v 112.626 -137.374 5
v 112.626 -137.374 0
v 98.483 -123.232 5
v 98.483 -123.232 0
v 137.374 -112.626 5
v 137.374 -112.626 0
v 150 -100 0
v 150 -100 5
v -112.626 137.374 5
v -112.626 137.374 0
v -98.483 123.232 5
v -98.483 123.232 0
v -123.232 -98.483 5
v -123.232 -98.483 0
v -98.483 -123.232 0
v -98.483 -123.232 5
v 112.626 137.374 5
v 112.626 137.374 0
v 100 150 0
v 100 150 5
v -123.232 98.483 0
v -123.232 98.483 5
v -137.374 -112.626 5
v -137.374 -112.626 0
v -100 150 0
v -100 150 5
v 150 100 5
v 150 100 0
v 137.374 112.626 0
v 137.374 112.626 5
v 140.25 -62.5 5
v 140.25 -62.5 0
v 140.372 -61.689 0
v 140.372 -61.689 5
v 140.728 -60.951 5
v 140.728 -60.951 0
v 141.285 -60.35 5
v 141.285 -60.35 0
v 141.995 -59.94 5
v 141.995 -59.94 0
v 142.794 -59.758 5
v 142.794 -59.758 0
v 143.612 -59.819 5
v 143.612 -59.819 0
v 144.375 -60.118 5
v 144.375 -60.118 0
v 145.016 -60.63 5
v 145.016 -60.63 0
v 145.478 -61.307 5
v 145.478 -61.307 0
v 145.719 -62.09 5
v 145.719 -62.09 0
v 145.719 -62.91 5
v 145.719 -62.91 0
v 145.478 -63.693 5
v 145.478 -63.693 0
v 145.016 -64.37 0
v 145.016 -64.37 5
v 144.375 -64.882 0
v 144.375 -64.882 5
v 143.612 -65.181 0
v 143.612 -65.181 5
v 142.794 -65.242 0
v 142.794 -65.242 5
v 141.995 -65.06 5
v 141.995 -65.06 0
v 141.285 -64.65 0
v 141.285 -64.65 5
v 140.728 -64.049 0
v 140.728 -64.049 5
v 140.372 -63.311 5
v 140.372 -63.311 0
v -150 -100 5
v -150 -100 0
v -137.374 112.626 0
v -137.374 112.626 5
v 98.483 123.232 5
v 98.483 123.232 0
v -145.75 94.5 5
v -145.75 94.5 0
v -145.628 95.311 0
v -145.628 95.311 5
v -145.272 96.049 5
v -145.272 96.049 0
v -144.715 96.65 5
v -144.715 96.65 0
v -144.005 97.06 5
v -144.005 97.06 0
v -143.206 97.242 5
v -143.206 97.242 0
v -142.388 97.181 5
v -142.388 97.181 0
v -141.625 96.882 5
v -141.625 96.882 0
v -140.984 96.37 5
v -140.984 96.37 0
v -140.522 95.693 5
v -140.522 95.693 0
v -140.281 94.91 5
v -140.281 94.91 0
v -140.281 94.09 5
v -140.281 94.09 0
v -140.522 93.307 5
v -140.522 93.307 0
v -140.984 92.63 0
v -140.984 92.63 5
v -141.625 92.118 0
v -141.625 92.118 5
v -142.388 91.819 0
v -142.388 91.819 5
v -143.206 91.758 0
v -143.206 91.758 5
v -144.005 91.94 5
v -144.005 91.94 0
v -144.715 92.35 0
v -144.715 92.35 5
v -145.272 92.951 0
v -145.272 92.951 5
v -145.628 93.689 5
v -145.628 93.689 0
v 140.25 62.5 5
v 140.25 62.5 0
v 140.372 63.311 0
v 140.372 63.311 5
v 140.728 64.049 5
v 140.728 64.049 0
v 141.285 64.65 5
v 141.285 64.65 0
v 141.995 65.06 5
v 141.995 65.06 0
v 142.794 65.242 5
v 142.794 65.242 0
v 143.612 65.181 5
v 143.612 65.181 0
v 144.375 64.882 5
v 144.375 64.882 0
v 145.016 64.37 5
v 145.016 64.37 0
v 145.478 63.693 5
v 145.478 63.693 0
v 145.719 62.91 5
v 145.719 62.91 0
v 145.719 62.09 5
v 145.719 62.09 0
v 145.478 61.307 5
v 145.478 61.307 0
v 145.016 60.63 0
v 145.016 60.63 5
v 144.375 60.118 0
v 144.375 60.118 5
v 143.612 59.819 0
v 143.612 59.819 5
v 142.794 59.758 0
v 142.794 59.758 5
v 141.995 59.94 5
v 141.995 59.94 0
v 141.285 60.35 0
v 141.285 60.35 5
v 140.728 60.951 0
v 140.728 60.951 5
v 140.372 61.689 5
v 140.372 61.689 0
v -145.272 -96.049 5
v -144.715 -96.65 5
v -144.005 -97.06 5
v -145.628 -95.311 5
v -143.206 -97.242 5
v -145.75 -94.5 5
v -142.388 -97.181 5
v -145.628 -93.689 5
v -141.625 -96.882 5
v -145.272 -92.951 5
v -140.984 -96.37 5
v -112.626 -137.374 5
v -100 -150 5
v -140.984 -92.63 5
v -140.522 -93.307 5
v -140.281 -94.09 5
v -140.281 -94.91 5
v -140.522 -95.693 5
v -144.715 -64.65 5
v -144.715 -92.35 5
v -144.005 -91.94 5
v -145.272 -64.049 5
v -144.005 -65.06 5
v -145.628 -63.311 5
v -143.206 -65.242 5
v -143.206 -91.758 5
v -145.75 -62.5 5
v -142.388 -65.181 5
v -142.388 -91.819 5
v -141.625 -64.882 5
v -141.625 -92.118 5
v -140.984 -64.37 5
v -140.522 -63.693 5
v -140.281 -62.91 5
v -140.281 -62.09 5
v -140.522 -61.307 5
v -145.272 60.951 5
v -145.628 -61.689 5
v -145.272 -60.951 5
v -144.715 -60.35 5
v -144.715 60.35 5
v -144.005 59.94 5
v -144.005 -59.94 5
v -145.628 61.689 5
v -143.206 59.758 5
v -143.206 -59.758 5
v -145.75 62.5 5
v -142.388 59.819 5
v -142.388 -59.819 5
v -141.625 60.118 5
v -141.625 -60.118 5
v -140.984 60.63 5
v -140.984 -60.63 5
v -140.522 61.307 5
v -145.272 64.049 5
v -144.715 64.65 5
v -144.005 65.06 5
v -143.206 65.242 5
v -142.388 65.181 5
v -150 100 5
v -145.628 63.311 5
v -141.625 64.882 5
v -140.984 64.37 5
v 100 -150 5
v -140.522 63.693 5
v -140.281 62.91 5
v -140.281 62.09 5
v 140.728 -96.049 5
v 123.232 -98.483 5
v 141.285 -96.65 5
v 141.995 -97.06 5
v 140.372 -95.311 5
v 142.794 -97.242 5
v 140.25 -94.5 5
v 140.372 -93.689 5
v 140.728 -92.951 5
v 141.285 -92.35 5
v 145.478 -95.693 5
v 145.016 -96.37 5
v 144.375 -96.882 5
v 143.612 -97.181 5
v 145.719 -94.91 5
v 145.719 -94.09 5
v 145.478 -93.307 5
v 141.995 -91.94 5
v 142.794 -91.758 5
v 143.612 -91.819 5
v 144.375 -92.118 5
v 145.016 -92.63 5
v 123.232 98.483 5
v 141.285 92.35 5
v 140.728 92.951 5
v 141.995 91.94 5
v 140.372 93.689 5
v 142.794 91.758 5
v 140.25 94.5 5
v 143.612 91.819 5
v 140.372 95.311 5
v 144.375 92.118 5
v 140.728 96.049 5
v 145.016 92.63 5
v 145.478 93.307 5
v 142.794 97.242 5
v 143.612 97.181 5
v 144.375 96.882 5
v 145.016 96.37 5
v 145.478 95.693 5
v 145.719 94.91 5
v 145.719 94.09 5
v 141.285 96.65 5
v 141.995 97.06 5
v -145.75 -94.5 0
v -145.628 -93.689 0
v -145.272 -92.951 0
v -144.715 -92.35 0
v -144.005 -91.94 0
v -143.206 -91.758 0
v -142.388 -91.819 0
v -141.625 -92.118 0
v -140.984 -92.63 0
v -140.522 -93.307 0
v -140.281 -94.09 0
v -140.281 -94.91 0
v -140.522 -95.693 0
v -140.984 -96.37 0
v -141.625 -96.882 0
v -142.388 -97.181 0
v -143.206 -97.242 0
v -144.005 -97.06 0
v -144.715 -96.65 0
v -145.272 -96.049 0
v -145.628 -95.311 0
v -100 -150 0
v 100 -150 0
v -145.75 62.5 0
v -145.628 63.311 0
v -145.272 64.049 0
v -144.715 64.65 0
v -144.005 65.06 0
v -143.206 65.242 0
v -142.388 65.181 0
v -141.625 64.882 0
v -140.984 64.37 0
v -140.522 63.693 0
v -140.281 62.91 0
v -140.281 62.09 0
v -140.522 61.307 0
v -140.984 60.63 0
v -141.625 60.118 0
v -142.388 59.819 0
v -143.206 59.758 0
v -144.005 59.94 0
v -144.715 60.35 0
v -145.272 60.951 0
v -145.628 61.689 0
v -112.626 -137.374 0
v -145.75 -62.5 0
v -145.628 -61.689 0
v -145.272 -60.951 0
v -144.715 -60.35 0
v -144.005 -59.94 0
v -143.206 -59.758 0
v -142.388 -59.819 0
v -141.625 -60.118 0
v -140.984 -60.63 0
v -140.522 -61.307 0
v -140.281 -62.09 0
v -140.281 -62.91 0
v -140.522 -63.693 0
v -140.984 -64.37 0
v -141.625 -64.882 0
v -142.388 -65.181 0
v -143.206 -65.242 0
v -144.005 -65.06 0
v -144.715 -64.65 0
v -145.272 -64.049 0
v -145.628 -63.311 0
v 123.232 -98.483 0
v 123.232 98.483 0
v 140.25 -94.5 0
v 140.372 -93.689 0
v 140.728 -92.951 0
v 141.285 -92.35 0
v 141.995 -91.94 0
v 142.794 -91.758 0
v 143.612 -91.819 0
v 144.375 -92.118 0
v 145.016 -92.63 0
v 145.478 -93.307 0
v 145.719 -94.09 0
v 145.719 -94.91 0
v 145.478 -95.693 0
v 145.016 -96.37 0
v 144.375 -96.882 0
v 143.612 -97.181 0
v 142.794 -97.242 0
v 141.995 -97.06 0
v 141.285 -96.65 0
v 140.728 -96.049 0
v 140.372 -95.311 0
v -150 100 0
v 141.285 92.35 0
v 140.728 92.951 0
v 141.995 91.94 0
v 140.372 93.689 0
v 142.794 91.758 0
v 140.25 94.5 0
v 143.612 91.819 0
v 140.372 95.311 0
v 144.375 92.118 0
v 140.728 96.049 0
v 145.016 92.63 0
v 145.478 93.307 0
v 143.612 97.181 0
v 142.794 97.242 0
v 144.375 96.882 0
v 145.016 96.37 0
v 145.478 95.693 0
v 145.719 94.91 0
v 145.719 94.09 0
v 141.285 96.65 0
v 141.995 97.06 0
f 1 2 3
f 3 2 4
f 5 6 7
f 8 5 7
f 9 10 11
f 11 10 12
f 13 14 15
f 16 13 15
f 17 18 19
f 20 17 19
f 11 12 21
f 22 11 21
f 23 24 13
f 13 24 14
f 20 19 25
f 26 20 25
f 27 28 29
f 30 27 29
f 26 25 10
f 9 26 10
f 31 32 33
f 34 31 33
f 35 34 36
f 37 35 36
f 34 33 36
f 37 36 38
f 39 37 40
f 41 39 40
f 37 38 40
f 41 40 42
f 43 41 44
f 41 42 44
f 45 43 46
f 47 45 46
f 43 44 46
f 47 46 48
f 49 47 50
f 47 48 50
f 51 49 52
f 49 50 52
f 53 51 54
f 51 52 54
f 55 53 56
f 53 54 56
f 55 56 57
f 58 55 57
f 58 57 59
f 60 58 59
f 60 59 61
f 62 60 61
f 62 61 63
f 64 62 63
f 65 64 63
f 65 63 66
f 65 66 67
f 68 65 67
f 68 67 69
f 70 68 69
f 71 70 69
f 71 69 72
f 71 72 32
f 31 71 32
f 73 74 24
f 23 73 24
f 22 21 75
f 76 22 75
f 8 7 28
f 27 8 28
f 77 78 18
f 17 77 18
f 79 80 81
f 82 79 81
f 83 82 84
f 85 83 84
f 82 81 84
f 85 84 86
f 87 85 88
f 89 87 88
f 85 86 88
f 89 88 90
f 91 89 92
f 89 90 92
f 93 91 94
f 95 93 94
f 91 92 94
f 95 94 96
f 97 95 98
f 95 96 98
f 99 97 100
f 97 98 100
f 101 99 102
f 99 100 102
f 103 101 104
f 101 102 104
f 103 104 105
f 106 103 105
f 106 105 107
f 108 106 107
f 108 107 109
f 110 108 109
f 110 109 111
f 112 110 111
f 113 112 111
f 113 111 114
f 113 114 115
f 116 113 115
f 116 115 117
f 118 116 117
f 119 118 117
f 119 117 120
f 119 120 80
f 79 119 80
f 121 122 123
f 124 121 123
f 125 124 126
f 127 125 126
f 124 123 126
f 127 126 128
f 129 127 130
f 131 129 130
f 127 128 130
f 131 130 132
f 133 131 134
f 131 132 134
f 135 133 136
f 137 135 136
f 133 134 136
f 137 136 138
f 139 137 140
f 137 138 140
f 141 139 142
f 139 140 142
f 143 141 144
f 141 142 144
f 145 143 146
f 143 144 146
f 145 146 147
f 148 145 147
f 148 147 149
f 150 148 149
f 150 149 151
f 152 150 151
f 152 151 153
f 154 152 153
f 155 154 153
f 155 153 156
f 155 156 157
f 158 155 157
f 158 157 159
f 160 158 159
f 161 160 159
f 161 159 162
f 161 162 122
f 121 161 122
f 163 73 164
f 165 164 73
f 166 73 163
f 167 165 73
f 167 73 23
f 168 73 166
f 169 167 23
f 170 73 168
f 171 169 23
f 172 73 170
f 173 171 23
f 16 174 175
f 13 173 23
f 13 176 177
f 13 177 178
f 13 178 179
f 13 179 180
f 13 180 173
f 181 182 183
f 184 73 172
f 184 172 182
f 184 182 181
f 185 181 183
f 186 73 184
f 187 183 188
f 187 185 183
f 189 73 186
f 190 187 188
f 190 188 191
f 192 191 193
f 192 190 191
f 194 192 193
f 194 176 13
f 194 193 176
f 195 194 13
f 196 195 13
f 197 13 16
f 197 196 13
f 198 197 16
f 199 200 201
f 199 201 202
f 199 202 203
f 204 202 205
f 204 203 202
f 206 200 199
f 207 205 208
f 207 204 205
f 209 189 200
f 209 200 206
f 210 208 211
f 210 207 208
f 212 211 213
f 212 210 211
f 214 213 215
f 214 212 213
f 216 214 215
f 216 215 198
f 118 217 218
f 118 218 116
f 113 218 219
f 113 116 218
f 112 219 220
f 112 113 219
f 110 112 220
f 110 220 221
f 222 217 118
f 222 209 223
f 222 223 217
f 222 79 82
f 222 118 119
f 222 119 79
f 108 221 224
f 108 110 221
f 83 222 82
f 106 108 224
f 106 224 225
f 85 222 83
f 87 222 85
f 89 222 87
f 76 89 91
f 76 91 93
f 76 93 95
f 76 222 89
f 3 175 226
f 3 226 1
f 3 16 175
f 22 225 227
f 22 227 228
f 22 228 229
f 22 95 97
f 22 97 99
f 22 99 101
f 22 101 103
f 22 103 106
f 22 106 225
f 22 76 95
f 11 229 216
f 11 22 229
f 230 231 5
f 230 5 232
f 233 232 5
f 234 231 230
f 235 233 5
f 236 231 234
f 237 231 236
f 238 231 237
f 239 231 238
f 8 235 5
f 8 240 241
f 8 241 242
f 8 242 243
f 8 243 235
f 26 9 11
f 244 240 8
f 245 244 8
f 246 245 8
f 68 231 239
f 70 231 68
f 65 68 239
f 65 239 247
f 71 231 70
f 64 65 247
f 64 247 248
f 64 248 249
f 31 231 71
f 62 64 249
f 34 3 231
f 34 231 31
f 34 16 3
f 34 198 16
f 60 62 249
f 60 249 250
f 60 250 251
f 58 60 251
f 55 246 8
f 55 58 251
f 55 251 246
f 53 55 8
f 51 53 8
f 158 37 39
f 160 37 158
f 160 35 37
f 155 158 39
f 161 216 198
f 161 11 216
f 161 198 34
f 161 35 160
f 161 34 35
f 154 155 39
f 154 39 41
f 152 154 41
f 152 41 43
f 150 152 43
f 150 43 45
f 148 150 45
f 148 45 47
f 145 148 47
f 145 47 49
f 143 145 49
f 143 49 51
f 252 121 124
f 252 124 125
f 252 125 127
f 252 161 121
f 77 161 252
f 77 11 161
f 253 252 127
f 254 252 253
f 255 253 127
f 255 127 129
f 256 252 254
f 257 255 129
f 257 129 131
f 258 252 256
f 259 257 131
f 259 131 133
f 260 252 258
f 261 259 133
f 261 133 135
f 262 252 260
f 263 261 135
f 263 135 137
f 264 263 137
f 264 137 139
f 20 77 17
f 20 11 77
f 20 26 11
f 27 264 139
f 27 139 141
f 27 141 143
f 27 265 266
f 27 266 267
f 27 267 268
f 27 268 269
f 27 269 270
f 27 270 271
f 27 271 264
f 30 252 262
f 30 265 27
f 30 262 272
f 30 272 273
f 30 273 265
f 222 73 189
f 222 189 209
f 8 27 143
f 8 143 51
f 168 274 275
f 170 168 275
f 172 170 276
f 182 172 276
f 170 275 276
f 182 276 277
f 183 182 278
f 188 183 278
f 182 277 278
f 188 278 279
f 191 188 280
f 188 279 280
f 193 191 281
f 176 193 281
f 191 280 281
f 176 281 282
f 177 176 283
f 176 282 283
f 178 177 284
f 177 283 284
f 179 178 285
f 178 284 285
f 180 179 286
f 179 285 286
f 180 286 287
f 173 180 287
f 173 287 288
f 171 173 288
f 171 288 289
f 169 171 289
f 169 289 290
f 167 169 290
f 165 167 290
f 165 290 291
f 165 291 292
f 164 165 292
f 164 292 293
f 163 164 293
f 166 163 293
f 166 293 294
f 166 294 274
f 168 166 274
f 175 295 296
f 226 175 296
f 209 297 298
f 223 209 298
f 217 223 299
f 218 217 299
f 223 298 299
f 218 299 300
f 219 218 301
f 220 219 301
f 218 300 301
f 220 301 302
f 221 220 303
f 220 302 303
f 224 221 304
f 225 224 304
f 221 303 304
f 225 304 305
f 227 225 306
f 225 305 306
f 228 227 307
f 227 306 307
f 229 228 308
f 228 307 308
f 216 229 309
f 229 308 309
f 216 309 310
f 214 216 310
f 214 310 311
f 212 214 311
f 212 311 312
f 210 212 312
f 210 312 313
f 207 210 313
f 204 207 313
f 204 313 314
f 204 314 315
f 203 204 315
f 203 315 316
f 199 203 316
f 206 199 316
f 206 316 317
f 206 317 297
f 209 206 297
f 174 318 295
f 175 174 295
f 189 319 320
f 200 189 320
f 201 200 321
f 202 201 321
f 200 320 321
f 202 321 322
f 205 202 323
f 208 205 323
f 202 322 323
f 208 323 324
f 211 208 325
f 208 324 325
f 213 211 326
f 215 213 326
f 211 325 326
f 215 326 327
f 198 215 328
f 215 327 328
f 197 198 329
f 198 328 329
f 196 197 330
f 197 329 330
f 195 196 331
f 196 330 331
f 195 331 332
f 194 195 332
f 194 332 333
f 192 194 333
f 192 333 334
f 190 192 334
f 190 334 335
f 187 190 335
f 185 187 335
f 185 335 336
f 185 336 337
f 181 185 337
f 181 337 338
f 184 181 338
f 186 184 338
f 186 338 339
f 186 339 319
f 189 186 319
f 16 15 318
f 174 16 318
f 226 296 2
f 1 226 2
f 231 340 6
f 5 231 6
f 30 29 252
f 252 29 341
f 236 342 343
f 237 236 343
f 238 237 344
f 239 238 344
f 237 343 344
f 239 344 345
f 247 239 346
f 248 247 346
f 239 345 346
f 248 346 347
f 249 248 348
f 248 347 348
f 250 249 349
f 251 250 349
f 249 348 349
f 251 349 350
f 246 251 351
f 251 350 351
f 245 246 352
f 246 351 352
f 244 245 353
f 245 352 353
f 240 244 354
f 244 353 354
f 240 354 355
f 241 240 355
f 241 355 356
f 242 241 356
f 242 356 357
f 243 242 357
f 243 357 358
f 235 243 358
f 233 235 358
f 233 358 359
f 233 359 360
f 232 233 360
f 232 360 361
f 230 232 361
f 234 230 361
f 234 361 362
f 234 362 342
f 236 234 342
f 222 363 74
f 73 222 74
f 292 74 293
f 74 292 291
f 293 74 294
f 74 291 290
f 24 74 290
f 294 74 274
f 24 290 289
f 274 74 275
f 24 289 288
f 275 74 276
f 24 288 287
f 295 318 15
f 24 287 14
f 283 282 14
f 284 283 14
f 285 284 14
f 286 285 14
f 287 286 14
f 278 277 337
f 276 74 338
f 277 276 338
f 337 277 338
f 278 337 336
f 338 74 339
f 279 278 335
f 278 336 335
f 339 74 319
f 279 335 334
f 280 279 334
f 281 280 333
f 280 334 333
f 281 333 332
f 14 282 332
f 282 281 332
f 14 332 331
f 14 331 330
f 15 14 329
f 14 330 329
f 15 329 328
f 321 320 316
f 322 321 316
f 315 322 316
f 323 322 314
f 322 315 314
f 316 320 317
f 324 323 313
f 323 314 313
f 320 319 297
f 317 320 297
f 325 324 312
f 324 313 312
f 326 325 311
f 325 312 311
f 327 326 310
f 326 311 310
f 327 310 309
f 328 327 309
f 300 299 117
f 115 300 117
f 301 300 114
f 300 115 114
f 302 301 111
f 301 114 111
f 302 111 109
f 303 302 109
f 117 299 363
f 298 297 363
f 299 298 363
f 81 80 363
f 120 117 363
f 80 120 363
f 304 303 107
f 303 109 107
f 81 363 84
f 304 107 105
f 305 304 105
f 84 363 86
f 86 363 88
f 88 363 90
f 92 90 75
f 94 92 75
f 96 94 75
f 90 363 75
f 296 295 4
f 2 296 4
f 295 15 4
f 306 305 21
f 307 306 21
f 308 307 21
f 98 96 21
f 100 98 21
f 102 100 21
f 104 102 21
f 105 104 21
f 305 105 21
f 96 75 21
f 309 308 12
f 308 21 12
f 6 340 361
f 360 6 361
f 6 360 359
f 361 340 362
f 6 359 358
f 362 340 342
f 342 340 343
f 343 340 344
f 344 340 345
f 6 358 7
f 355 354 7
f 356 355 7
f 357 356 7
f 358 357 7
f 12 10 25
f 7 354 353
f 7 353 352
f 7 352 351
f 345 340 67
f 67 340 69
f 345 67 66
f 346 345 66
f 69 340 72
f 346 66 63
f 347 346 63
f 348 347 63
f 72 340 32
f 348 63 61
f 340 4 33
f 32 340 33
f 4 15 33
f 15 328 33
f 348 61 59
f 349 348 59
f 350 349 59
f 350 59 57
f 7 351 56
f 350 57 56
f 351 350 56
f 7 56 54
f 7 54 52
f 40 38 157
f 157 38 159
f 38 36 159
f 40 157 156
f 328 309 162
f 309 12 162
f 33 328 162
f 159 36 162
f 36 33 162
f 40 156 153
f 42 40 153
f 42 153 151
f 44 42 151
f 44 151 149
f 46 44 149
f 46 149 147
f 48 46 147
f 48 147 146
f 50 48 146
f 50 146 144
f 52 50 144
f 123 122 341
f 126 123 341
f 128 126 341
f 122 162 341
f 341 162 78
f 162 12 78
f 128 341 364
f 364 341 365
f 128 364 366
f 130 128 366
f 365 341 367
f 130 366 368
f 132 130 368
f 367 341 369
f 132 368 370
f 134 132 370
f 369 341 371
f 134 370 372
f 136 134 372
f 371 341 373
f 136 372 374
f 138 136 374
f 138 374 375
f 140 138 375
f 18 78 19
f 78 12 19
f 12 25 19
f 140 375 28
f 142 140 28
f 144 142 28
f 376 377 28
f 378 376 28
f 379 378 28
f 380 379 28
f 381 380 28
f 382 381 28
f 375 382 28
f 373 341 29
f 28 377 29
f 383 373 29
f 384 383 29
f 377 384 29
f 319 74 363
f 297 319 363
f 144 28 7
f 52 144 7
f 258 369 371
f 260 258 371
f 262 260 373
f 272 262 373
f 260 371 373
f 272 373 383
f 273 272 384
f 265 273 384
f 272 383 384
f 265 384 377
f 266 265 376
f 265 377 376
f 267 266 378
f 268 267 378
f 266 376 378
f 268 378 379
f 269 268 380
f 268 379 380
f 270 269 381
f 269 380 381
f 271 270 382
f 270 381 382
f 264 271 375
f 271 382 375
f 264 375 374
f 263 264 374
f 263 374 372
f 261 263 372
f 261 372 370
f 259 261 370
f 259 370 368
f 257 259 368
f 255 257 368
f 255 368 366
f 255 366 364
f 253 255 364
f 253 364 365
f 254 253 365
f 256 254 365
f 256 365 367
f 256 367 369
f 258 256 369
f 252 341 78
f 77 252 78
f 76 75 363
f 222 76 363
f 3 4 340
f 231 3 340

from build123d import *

# Parameters (mm, degrees)
BOSS_EXTRU_1_DEPTH      = 5
ESQUISSE2_R             = 2.75
ENL_V_MAT_EXTRU_1_DEPTH = 213.190951739


with BuildPart() as part:
    # Esquisse1 → Boss.-Extru.1 (new body)
    with BuildSketch(Plane.XY):
        Polygon((112.625631329, 137.374368671), (100, 150), (-100, 150), (-112.625631329, 137.374368671), (-98.483495706, 123.232233047), (-123.232233047, 98.483495706), (-137.374368671, 112.625631329), (-150, 100), (-150, -100), (-137.374368671, -112.625631329), (-123.232233047, -98.483495706), (-98.483495706, -123.232233047), (-112.625631329, -137.374368671), (-100, -150), (100, -150), (112.625631329, -137.374368671), (98.483495706, -123.232233047), (123.232233047, -98.483495706), (137.374368671, -112.625631329), (150, -100), (150, 100), (137.374368671, 112.625631329), (123.232233047, 98.483495706), (98.483495706, 123.232233047), align=None)
    extrude(amount=BOSS_EXTRU_1_DEPTH)

    # Esquisse2 → Enlèv. mat.-Extru.1 (cut, through all)
    with BuildSketch(Plane(origin=(0, 0, 0), x_dir=(-1, 0, 0), z_dir=(0, 0, -1))):
        with Locations((143, -62.5)):
            Circle(ESQUISSE2_R)
        with Locations((143, -94.5)):
            Circle(ESQUISSE2_R)
        with Locations((143, 62.5)):
            Circle(ESQUISSE2_R)
        with Locations((143, 94.5)):
            Circle(ESQUISSE2_R)
        with Locations((-143, -62.5)):
            Circle(ESQUISSE2_R)
        with Locations((-143, -94.5)):
            Circle(ESQUISSE2_R)
        with Locations((-143, 62.5)):
            Circle(ESQUISSE2_R)
        with Locations((-143, 94.5)):
            Circle(ESQUISSE2_R)
    extrude(amount=-ENL_V_MAT_EXTRU_1_DEPTH, mode=Mode.SUBTRACT)


solid = part.part
